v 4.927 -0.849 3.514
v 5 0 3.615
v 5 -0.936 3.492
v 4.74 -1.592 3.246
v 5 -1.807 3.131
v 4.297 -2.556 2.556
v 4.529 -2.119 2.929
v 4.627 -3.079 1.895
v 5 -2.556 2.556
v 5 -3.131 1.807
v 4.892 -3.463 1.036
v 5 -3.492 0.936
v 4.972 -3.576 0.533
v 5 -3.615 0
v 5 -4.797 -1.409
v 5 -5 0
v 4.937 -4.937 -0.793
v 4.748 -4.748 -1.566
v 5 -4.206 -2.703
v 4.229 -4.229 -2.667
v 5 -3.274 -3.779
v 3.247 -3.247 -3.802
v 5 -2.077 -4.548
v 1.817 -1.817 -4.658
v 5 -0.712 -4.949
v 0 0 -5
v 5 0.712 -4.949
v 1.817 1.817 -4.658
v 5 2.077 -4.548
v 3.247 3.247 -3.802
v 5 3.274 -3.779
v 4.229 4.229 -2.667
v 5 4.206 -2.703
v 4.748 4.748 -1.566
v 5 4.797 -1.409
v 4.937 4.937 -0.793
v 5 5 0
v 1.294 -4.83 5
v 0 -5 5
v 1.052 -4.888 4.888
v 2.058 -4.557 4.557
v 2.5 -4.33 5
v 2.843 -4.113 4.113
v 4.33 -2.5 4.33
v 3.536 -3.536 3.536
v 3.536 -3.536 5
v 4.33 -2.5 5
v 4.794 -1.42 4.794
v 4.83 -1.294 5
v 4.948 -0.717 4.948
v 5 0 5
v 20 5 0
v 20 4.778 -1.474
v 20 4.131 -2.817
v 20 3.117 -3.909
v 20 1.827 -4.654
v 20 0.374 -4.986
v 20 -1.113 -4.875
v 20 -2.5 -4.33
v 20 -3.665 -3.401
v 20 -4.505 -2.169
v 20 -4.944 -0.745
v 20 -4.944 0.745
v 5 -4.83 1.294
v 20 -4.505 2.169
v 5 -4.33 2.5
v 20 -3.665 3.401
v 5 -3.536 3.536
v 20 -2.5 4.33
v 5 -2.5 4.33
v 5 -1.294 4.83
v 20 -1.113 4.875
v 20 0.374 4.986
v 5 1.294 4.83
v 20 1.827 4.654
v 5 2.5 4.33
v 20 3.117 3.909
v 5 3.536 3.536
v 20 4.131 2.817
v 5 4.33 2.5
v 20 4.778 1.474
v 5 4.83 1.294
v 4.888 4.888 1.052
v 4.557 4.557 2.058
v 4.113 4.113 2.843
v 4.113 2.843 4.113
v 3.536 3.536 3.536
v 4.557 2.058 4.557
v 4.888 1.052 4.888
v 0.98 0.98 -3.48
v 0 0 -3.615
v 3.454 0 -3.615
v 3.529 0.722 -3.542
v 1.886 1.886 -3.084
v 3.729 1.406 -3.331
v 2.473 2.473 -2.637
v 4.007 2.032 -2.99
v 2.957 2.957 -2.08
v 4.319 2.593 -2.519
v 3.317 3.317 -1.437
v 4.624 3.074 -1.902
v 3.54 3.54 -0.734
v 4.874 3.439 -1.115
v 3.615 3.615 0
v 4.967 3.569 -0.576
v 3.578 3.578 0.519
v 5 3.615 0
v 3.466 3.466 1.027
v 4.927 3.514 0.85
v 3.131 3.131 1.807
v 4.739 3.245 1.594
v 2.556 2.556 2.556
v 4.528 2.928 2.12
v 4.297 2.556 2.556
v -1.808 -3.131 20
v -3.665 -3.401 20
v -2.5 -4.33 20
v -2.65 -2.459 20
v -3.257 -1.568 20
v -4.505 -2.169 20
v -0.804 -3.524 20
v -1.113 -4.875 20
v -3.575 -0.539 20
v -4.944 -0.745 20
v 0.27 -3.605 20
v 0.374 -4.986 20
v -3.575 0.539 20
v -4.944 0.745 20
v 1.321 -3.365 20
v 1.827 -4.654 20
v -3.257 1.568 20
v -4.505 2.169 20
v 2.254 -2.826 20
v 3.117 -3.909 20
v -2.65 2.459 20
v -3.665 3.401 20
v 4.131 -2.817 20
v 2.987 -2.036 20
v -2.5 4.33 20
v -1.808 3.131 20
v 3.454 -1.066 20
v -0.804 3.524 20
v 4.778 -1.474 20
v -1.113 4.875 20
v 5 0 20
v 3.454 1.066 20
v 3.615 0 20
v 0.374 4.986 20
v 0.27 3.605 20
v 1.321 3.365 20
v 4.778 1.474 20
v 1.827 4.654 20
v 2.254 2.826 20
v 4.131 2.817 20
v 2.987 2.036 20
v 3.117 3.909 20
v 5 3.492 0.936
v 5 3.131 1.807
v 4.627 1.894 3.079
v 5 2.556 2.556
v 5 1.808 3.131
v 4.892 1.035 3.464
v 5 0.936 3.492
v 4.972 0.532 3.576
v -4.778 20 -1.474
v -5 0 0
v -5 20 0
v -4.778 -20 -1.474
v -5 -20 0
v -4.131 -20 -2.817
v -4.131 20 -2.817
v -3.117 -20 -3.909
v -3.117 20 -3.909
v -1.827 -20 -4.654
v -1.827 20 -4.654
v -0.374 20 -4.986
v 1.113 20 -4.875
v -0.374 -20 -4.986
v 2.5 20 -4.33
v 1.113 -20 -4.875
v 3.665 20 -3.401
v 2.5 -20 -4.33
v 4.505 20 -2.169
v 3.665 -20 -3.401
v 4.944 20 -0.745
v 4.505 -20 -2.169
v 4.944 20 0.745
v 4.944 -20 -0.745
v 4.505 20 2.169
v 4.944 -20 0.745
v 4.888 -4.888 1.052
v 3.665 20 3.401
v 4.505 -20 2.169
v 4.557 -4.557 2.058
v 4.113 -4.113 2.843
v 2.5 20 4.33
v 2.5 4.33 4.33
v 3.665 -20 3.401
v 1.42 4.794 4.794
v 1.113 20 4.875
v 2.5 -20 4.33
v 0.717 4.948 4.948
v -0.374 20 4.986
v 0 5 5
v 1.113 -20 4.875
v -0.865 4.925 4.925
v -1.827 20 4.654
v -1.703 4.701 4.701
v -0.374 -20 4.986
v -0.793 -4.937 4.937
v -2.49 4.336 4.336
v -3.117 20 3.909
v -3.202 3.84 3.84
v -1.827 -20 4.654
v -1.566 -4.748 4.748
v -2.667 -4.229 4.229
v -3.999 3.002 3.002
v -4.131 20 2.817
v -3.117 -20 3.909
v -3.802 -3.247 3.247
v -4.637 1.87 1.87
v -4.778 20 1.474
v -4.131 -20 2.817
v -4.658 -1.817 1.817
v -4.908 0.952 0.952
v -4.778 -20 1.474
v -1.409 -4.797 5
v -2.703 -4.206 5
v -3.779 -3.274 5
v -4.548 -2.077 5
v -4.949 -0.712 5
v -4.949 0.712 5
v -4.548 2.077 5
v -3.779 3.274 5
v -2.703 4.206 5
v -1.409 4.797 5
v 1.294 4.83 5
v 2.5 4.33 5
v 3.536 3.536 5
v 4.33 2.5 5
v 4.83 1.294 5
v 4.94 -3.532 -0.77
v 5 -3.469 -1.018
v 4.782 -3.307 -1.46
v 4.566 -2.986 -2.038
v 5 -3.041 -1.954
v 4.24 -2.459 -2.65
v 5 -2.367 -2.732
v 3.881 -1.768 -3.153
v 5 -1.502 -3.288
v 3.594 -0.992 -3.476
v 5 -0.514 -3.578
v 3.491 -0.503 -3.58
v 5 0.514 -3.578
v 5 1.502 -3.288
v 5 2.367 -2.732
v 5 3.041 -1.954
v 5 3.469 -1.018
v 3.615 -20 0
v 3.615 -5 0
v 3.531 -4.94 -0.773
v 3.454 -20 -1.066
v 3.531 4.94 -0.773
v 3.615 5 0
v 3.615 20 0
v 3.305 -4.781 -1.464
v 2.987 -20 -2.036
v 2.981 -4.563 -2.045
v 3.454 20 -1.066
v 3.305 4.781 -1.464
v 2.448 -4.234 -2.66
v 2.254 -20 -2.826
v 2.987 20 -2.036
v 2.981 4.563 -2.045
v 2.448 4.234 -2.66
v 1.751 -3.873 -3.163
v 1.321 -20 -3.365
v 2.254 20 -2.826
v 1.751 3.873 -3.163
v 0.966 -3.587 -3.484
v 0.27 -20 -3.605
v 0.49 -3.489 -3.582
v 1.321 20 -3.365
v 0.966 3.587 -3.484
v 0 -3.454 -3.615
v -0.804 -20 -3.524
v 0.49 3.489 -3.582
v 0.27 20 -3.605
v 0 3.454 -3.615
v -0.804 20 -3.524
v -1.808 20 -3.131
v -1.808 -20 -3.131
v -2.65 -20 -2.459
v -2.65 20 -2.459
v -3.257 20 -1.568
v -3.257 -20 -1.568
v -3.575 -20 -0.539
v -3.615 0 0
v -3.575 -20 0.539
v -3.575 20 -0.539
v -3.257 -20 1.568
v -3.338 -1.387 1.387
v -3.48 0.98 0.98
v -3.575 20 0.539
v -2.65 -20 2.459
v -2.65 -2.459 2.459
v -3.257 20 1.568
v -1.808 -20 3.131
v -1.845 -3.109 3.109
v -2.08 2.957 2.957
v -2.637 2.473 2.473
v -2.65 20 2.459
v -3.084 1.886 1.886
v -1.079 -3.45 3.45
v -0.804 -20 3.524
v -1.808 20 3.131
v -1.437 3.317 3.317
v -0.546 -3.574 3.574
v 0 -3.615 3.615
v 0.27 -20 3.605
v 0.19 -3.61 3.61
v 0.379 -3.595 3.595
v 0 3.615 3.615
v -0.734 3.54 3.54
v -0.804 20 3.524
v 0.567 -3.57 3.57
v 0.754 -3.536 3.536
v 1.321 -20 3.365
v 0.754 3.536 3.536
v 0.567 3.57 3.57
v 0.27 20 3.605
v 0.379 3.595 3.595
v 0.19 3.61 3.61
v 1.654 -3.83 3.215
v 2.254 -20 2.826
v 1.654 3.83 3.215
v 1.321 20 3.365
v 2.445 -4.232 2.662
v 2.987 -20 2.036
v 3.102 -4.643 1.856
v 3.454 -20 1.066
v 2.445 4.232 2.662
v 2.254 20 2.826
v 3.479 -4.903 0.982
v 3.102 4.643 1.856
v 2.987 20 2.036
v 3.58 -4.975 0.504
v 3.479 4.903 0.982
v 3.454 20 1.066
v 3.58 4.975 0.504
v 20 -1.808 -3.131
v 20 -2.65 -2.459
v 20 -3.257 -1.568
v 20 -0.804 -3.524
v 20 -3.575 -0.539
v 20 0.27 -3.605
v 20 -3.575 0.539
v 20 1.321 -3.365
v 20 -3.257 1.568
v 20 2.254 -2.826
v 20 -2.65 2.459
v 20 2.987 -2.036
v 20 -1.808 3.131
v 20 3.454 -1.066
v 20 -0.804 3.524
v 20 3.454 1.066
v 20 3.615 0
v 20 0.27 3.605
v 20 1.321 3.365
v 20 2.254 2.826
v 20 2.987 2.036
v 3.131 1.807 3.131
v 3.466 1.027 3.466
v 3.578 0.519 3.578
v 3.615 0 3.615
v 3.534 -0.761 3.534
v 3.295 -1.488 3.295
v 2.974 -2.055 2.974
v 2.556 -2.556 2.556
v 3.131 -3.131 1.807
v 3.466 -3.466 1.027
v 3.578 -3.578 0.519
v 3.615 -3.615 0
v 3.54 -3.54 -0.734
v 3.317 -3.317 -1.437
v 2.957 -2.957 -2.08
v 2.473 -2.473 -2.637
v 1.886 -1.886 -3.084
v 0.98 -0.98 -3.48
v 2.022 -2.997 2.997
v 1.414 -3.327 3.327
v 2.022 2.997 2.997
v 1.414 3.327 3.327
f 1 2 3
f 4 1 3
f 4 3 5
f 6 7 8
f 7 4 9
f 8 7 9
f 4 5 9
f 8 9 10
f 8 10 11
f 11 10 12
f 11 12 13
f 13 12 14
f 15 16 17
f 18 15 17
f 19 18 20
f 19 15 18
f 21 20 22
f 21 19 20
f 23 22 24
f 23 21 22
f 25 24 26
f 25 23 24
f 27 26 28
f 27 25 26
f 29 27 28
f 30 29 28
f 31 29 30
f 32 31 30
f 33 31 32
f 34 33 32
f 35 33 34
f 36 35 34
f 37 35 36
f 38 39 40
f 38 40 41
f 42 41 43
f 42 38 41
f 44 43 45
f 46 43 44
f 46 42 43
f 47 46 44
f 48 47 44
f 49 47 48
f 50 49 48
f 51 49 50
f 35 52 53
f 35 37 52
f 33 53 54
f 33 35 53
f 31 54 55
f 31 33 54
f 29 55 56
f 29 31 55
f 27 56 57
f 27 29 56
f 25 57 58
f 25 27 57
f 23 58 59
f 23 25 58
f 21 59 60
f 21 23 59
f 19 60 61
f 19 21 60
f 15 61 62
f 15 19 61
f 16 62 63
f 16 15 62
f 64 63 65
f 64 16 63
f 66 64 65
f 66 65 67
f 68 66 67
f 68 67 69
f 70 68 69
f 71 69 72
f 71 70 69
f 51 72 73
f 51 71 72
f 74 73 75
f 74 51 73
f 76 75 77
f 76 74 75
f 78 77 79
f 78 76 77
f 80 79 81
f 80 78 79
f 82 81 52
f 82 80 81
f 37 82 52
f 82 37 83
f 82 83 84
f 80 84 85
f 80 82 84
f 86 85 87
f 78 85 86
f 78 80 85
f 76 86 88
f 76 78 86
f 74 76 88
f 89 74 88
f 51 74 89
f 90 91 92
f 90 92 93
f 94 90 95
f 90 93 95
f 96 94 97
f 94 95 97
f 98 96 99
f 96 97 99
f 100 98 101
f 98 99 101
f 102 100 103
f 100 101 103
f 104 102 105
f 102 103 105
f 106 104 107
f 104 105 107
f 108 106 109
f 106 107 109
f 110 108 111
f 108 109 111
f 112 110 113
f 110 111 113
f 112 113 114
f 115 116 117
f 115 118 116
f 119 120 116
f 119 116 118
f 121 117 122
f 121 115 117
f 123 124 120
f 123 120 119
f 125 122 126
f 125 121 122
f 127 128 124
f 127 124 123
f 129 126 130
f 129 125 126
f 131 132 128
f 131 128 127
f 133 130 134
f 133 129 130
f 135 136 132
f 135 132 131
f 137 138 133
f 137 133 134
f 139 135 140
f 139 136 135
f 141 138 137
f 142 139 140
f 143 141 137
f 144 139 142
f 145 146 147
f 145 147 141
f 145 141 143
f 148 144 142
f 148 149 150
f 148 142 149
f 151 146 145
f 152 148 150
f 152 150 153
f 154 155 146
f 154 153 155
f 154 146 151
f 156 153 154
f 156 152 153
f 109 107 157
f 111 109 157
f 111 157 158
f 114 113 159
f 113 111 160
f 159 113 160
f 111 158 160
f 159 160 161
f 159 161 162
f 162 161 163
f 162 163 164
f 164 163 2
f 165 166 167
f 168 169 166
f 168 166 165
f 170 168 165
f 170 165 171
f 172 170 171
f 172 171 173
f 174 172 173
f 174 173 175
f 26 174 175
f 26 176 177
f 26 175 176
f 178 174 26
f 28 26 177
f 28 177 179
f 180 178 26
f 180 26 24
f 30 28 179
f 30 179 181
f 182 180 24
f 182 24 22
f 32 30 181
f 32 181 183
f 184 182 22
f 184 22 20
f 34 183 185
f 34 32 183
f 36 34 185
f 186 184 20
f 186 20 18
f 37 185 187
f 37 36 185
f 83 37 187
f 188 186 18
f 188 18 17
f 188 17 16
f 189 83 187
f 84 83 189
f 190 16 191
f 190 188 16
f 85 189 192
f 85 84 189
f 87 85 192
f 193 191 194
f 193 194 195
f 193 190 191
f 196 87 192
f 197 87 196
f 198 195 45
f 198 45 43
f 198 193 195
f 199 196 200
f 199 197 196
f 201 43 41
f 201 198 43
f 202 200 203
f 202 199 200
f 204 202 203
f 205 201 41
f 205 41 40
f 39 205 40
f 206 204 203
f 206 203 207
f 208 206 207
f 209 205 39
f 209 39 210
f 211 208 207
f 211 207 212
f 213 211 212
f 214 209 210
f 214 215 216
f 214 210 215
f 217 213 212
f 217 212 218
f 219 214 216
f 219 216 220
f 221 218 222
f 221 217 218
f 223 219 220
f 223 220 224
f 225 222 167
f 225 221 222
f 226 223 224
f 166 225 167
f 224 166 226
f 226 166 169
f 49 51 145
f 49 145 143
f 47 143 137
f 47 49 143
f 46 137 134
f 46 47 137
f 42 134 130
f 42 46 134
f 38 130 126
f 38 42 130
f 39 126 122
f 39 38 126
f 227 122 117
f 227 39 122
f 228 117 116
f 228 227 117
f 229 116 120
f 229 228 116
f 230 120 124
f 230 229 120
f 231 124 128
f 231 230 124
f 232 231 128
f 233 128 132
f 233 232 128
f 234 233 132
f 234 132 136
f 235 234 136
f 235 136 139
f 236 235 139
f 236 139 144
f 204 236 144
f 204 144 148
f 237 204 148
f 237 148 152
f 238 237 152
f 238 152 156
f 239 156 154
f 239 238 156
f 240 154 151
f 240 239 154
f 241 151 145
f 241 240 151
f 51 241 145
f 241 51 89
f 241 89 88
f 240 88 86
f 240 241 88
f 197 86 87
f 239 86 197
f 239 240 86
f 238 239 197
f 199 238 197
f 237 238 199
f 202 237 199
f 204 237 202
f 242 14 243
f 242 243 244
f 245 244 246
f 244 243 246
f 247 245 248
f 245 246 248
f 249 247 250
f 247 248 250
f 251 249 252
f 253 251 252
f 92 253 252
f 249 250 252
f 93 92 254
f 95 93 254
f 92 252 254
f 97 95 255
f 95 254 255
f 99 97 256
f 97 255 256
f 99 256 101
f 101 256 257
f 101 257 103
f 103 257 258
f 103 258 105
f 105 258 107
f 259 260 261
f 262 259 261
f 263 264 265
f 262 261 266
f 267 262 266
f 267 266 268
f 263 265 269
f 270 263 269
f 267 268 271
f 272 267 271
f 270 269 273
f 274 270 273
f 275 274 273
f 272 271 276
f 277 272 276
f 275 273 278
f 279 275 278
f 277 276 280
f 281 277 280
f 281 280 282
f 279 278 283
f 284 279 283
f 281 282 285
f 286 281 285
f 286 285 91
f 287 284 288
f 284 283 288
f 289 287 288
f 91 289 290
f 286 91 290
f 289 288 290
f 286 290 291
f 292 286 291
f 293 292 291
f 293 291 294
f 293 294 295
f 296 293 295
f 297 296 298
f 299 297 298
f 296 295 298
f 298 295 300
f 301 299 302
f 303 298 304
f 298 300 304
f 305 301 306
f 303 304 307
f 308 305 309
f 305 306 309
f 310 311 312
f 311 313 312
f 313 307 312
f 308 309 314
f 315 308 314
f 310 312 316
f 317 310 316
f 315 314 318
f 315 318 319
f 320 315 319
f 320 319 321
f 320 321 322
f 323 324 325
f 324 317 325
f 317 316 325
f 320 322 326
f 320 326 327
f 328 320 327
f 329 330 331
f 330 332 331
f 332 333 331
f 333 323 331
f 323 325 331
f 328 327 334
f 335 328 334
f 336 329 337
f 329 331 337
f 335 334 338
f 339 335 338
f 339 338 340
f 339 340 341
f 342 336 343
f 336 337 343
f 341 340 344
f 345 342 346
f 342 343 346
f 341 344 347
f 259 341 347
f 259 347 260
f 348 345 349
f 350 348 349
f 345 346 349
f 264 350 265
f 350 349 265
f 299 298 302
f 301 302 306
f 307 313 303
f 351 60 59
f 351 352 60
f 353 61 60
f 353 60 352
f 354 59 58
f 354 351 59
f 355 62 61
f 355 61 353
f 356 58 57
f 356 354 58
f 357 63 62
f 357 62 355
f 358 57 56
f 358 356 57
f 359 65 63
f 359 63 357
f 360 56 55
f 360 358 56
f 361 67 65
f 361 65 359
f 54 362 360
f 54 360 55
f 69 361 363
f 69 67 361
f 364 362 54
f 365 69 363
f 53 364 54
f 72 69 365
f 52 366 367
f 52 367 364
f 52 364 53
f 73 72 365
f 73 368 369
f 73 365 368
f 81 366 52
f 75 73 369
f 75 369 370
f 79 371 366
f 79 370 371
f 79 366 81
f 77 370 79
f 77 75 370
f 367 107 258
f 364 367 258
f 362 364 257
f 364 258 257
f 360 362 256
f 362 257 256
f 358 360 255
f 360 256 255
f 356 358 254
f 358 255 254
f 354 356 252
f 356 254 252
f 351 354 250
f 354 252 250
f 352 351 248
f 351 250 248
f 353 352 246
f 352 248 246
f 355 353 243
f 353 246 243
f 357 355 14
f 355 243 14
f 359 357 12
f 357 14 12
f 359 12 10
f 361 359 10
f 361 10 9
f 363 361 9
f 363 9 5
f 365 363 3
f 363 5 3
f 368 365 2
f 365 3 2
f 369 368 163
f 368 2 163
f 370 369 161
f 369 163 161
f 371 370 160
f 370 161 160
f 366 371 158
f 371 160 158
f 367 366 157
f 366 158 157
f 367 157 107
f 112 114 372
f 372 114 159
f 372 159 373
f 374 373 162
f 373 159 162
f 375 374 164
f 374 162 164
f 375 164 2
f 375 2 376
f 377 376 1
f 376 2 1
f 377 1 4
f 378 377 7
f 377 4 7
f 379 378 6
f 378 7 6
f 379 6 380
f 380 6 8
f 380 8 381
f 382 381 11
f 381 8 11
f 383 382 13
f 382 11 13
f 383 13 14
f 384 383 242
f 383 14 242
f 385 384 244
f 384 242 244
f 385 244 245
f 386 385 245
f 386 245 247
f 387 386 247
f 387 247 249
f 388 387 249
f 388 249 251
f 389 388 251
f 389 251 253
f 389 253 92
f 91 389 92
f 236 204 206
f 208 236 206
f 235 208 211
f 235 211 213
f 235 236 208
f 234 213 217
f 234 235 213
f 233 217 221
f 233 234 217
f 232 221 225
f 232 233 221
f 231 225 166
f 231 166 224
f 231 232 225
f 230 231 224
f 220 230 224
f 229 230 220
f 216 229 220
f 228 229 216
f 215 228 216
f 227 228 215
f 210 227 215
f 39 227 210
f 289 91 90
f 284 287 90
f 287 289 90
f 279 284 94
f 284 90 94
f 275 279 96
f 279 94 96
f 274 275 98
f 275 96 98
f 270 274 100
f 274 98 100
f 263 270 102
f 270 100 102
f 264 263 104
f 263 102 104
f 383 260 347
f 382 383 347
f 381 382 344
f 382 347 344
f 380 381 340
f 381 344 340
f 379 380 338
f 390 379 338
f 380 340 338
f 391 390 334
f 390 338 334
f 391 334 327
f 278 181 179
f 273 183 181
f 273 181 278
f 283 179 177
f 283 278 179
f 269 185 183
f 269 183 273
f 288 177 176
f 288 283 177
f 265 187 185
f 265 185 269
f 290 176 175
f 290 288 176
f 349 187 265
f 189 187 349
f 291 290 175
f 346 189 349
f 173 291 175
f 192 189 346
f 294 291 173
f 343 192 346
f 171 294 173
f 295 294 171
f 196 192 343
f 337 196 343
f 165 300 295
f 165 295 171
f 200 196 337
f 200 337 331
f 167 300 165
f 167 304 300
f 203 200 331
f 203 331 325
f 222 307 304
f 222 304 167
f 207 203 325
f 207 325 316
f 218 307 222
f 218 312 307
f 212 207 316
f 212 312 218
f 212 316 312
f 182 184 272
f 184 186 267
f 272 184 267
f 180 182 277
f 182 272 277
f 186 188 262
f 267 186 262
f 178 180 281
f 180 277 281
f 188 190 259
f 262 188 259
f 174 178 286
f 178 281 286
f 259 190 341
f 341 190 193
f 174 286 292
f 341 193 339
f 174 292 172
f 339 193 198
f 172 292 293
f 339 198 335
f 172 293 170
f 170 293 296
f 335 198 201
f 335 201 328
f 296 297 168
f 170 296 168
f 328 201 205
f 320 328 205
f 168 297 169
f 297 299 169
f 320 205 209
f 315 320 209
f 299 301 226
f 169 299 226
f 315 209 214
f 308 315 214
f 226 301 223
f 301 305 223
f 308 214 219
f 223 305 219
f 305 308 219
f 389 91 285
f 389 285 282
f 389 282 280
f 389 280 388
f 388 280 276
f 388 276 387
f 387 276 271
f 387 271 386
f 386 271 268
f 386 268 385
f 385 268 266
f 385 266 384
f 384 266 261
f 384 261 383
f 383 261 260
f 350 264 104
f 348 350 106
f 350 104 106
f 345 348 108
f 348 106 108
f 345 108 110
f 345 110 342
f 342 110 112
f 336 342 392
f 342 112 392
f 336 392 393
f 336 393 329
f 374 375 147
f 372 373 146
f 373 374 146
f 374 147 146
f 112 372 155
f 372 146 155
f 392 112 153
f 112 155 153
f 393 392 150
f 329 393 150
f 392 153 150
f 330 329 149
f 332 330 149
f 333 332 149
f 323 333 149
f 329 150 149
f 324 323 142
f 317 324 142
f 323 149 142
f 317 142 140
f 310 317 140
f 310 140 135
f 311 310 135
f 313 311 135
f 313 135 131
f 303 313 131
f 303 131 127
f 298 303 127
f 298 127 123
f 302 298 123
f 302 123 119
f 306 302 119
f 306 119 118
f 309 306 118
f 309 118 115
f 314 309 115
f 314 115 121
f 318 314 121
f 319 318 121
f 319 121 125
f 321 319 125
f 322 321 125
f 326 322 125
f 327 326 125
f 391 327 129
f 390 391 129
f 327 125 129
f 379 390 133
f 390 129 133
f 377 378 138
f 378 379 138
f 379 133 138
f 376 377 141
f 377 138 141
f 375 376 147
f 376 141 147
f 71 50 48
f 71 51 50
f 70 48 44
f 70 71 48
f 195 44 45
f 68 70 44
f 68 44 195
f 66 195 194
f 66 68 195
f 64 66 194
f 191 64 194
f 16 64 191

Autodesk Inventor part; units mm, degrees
ref_plane "XZ Plane" through (0, 0, 0) normal (0, 1, 0) x (-1, 0, 0)
sketch "Sketch1" plane through (0, 0, 0) normal (0, 1, 0) x (-1, 0, 0)
  circle A0 centre (0, 0) radius 3.575
  circle A1 centre (0, 0) radius 5
  dimension "d0" = 7.15
  dimension "d1" = 10
extrude "Extrusion1" add sketch "Sketch1" along normal mid plane 40
ref_plane "Work Plane1" through (0, 0, 5) normal (0, 0, 1) x (1, 0, 0)
sketch "Sketch2" plane through (0, 0, 5) normal (0, 0, 1) x (1, 0, 0)
  circle A0 centre (0, 0) radius 3.575
  circle A1 centre (0, 0) radius 5
  line L0 (5, 20) -> (-5, 20) projected
  dimension "d4" = 7.15
  dimension "d5" = 10
  dimension "d22" = 0
extrude "Extrusion2" add sketch "Sketch2" along normal blind 15 and the other way blind 5
sketch "Sketch3" plane through (0, 0, 20) normal (0, 0, 1) x (1, 0, 0)
  circle A0 centre (0, 0) radius 3.575
extrude "Extrusion3" cut sketch "Sketch3" against normal up to surface
sketch "Sketch4" plane through (0, 20, 0) normal (0, 1, 0) x (1, 0, 0)
  circle A0 centre (0, 0) radius 3.615
  dimension "d13" = 7.23
extrude "Extrusion4" cut sketch "Sketch4" against normal through all
ref_plane "Work Plane3" through (5, 0, 0) normal (1, 0, 0) x (0, 1, 0)
sketch "Sketch6" plane through (5, 0, 0) normal (1, 0, 0) x (0, 1, 0)
  circle A0 centre (0, 0) radius 3.615
  circle A1 centre (0, 0) radius 5
  dimension "d23" = 7.23
  dimension "d24" = 10
extrude "Extrusion6" add sketch "Sketch6" along normal blind 15 and the other way blind 5
sketch "Sketch7" plane through (0, 0, 20) normal (0, 0, 1) x (1, 0, 0)
  circle A0 centre (0, 0) radius 3.615
  dimension "d33" = 7.23
extrude "Extrusion7" cut sketch "Sketch7" against normal up to surface
sketch "Sketch8" plane through (0, -20, 0) normal (0, -1, 0) x (1, 0, 0)
  circle A0 centre (0, 0) radius 3.615
extrude "Extrusion8" cut sketch "Sketch8" against normal through all
sketch "Sketch9" plane through (20, 0, 0) normal (1, 0, 0) x (0, 0, -1)
  line L0 (0, 0) -> (-2.5562, 2.5562) projected
  circle A0 centre (0, 0) radius 3.615
  dimension "d34" = 7.23
extrude "Extrusion9" cut sketch "Sketch9" against normal up to surface
sketch "Sketch5" plane through (0, 0, -5) normal (0, 0, 1) x (1, 0, 0)
  line L0 (5, 15) -> (-5, 15) projected
  line L1 (-5, -15) -> (5, -15) projected
  line L2 (2, 15) -> (-2, 15)
  line L3 (-2, 15) -> (-2, -15)
  line L4 (-2, -15) -> (2, -15)
  line L5 (2, -15) -> (2, 15)
  point P0 (0, 0)
  dimension "d16" = 4
  dimension "d17" = 2
properties part number "T-joint-UP"
